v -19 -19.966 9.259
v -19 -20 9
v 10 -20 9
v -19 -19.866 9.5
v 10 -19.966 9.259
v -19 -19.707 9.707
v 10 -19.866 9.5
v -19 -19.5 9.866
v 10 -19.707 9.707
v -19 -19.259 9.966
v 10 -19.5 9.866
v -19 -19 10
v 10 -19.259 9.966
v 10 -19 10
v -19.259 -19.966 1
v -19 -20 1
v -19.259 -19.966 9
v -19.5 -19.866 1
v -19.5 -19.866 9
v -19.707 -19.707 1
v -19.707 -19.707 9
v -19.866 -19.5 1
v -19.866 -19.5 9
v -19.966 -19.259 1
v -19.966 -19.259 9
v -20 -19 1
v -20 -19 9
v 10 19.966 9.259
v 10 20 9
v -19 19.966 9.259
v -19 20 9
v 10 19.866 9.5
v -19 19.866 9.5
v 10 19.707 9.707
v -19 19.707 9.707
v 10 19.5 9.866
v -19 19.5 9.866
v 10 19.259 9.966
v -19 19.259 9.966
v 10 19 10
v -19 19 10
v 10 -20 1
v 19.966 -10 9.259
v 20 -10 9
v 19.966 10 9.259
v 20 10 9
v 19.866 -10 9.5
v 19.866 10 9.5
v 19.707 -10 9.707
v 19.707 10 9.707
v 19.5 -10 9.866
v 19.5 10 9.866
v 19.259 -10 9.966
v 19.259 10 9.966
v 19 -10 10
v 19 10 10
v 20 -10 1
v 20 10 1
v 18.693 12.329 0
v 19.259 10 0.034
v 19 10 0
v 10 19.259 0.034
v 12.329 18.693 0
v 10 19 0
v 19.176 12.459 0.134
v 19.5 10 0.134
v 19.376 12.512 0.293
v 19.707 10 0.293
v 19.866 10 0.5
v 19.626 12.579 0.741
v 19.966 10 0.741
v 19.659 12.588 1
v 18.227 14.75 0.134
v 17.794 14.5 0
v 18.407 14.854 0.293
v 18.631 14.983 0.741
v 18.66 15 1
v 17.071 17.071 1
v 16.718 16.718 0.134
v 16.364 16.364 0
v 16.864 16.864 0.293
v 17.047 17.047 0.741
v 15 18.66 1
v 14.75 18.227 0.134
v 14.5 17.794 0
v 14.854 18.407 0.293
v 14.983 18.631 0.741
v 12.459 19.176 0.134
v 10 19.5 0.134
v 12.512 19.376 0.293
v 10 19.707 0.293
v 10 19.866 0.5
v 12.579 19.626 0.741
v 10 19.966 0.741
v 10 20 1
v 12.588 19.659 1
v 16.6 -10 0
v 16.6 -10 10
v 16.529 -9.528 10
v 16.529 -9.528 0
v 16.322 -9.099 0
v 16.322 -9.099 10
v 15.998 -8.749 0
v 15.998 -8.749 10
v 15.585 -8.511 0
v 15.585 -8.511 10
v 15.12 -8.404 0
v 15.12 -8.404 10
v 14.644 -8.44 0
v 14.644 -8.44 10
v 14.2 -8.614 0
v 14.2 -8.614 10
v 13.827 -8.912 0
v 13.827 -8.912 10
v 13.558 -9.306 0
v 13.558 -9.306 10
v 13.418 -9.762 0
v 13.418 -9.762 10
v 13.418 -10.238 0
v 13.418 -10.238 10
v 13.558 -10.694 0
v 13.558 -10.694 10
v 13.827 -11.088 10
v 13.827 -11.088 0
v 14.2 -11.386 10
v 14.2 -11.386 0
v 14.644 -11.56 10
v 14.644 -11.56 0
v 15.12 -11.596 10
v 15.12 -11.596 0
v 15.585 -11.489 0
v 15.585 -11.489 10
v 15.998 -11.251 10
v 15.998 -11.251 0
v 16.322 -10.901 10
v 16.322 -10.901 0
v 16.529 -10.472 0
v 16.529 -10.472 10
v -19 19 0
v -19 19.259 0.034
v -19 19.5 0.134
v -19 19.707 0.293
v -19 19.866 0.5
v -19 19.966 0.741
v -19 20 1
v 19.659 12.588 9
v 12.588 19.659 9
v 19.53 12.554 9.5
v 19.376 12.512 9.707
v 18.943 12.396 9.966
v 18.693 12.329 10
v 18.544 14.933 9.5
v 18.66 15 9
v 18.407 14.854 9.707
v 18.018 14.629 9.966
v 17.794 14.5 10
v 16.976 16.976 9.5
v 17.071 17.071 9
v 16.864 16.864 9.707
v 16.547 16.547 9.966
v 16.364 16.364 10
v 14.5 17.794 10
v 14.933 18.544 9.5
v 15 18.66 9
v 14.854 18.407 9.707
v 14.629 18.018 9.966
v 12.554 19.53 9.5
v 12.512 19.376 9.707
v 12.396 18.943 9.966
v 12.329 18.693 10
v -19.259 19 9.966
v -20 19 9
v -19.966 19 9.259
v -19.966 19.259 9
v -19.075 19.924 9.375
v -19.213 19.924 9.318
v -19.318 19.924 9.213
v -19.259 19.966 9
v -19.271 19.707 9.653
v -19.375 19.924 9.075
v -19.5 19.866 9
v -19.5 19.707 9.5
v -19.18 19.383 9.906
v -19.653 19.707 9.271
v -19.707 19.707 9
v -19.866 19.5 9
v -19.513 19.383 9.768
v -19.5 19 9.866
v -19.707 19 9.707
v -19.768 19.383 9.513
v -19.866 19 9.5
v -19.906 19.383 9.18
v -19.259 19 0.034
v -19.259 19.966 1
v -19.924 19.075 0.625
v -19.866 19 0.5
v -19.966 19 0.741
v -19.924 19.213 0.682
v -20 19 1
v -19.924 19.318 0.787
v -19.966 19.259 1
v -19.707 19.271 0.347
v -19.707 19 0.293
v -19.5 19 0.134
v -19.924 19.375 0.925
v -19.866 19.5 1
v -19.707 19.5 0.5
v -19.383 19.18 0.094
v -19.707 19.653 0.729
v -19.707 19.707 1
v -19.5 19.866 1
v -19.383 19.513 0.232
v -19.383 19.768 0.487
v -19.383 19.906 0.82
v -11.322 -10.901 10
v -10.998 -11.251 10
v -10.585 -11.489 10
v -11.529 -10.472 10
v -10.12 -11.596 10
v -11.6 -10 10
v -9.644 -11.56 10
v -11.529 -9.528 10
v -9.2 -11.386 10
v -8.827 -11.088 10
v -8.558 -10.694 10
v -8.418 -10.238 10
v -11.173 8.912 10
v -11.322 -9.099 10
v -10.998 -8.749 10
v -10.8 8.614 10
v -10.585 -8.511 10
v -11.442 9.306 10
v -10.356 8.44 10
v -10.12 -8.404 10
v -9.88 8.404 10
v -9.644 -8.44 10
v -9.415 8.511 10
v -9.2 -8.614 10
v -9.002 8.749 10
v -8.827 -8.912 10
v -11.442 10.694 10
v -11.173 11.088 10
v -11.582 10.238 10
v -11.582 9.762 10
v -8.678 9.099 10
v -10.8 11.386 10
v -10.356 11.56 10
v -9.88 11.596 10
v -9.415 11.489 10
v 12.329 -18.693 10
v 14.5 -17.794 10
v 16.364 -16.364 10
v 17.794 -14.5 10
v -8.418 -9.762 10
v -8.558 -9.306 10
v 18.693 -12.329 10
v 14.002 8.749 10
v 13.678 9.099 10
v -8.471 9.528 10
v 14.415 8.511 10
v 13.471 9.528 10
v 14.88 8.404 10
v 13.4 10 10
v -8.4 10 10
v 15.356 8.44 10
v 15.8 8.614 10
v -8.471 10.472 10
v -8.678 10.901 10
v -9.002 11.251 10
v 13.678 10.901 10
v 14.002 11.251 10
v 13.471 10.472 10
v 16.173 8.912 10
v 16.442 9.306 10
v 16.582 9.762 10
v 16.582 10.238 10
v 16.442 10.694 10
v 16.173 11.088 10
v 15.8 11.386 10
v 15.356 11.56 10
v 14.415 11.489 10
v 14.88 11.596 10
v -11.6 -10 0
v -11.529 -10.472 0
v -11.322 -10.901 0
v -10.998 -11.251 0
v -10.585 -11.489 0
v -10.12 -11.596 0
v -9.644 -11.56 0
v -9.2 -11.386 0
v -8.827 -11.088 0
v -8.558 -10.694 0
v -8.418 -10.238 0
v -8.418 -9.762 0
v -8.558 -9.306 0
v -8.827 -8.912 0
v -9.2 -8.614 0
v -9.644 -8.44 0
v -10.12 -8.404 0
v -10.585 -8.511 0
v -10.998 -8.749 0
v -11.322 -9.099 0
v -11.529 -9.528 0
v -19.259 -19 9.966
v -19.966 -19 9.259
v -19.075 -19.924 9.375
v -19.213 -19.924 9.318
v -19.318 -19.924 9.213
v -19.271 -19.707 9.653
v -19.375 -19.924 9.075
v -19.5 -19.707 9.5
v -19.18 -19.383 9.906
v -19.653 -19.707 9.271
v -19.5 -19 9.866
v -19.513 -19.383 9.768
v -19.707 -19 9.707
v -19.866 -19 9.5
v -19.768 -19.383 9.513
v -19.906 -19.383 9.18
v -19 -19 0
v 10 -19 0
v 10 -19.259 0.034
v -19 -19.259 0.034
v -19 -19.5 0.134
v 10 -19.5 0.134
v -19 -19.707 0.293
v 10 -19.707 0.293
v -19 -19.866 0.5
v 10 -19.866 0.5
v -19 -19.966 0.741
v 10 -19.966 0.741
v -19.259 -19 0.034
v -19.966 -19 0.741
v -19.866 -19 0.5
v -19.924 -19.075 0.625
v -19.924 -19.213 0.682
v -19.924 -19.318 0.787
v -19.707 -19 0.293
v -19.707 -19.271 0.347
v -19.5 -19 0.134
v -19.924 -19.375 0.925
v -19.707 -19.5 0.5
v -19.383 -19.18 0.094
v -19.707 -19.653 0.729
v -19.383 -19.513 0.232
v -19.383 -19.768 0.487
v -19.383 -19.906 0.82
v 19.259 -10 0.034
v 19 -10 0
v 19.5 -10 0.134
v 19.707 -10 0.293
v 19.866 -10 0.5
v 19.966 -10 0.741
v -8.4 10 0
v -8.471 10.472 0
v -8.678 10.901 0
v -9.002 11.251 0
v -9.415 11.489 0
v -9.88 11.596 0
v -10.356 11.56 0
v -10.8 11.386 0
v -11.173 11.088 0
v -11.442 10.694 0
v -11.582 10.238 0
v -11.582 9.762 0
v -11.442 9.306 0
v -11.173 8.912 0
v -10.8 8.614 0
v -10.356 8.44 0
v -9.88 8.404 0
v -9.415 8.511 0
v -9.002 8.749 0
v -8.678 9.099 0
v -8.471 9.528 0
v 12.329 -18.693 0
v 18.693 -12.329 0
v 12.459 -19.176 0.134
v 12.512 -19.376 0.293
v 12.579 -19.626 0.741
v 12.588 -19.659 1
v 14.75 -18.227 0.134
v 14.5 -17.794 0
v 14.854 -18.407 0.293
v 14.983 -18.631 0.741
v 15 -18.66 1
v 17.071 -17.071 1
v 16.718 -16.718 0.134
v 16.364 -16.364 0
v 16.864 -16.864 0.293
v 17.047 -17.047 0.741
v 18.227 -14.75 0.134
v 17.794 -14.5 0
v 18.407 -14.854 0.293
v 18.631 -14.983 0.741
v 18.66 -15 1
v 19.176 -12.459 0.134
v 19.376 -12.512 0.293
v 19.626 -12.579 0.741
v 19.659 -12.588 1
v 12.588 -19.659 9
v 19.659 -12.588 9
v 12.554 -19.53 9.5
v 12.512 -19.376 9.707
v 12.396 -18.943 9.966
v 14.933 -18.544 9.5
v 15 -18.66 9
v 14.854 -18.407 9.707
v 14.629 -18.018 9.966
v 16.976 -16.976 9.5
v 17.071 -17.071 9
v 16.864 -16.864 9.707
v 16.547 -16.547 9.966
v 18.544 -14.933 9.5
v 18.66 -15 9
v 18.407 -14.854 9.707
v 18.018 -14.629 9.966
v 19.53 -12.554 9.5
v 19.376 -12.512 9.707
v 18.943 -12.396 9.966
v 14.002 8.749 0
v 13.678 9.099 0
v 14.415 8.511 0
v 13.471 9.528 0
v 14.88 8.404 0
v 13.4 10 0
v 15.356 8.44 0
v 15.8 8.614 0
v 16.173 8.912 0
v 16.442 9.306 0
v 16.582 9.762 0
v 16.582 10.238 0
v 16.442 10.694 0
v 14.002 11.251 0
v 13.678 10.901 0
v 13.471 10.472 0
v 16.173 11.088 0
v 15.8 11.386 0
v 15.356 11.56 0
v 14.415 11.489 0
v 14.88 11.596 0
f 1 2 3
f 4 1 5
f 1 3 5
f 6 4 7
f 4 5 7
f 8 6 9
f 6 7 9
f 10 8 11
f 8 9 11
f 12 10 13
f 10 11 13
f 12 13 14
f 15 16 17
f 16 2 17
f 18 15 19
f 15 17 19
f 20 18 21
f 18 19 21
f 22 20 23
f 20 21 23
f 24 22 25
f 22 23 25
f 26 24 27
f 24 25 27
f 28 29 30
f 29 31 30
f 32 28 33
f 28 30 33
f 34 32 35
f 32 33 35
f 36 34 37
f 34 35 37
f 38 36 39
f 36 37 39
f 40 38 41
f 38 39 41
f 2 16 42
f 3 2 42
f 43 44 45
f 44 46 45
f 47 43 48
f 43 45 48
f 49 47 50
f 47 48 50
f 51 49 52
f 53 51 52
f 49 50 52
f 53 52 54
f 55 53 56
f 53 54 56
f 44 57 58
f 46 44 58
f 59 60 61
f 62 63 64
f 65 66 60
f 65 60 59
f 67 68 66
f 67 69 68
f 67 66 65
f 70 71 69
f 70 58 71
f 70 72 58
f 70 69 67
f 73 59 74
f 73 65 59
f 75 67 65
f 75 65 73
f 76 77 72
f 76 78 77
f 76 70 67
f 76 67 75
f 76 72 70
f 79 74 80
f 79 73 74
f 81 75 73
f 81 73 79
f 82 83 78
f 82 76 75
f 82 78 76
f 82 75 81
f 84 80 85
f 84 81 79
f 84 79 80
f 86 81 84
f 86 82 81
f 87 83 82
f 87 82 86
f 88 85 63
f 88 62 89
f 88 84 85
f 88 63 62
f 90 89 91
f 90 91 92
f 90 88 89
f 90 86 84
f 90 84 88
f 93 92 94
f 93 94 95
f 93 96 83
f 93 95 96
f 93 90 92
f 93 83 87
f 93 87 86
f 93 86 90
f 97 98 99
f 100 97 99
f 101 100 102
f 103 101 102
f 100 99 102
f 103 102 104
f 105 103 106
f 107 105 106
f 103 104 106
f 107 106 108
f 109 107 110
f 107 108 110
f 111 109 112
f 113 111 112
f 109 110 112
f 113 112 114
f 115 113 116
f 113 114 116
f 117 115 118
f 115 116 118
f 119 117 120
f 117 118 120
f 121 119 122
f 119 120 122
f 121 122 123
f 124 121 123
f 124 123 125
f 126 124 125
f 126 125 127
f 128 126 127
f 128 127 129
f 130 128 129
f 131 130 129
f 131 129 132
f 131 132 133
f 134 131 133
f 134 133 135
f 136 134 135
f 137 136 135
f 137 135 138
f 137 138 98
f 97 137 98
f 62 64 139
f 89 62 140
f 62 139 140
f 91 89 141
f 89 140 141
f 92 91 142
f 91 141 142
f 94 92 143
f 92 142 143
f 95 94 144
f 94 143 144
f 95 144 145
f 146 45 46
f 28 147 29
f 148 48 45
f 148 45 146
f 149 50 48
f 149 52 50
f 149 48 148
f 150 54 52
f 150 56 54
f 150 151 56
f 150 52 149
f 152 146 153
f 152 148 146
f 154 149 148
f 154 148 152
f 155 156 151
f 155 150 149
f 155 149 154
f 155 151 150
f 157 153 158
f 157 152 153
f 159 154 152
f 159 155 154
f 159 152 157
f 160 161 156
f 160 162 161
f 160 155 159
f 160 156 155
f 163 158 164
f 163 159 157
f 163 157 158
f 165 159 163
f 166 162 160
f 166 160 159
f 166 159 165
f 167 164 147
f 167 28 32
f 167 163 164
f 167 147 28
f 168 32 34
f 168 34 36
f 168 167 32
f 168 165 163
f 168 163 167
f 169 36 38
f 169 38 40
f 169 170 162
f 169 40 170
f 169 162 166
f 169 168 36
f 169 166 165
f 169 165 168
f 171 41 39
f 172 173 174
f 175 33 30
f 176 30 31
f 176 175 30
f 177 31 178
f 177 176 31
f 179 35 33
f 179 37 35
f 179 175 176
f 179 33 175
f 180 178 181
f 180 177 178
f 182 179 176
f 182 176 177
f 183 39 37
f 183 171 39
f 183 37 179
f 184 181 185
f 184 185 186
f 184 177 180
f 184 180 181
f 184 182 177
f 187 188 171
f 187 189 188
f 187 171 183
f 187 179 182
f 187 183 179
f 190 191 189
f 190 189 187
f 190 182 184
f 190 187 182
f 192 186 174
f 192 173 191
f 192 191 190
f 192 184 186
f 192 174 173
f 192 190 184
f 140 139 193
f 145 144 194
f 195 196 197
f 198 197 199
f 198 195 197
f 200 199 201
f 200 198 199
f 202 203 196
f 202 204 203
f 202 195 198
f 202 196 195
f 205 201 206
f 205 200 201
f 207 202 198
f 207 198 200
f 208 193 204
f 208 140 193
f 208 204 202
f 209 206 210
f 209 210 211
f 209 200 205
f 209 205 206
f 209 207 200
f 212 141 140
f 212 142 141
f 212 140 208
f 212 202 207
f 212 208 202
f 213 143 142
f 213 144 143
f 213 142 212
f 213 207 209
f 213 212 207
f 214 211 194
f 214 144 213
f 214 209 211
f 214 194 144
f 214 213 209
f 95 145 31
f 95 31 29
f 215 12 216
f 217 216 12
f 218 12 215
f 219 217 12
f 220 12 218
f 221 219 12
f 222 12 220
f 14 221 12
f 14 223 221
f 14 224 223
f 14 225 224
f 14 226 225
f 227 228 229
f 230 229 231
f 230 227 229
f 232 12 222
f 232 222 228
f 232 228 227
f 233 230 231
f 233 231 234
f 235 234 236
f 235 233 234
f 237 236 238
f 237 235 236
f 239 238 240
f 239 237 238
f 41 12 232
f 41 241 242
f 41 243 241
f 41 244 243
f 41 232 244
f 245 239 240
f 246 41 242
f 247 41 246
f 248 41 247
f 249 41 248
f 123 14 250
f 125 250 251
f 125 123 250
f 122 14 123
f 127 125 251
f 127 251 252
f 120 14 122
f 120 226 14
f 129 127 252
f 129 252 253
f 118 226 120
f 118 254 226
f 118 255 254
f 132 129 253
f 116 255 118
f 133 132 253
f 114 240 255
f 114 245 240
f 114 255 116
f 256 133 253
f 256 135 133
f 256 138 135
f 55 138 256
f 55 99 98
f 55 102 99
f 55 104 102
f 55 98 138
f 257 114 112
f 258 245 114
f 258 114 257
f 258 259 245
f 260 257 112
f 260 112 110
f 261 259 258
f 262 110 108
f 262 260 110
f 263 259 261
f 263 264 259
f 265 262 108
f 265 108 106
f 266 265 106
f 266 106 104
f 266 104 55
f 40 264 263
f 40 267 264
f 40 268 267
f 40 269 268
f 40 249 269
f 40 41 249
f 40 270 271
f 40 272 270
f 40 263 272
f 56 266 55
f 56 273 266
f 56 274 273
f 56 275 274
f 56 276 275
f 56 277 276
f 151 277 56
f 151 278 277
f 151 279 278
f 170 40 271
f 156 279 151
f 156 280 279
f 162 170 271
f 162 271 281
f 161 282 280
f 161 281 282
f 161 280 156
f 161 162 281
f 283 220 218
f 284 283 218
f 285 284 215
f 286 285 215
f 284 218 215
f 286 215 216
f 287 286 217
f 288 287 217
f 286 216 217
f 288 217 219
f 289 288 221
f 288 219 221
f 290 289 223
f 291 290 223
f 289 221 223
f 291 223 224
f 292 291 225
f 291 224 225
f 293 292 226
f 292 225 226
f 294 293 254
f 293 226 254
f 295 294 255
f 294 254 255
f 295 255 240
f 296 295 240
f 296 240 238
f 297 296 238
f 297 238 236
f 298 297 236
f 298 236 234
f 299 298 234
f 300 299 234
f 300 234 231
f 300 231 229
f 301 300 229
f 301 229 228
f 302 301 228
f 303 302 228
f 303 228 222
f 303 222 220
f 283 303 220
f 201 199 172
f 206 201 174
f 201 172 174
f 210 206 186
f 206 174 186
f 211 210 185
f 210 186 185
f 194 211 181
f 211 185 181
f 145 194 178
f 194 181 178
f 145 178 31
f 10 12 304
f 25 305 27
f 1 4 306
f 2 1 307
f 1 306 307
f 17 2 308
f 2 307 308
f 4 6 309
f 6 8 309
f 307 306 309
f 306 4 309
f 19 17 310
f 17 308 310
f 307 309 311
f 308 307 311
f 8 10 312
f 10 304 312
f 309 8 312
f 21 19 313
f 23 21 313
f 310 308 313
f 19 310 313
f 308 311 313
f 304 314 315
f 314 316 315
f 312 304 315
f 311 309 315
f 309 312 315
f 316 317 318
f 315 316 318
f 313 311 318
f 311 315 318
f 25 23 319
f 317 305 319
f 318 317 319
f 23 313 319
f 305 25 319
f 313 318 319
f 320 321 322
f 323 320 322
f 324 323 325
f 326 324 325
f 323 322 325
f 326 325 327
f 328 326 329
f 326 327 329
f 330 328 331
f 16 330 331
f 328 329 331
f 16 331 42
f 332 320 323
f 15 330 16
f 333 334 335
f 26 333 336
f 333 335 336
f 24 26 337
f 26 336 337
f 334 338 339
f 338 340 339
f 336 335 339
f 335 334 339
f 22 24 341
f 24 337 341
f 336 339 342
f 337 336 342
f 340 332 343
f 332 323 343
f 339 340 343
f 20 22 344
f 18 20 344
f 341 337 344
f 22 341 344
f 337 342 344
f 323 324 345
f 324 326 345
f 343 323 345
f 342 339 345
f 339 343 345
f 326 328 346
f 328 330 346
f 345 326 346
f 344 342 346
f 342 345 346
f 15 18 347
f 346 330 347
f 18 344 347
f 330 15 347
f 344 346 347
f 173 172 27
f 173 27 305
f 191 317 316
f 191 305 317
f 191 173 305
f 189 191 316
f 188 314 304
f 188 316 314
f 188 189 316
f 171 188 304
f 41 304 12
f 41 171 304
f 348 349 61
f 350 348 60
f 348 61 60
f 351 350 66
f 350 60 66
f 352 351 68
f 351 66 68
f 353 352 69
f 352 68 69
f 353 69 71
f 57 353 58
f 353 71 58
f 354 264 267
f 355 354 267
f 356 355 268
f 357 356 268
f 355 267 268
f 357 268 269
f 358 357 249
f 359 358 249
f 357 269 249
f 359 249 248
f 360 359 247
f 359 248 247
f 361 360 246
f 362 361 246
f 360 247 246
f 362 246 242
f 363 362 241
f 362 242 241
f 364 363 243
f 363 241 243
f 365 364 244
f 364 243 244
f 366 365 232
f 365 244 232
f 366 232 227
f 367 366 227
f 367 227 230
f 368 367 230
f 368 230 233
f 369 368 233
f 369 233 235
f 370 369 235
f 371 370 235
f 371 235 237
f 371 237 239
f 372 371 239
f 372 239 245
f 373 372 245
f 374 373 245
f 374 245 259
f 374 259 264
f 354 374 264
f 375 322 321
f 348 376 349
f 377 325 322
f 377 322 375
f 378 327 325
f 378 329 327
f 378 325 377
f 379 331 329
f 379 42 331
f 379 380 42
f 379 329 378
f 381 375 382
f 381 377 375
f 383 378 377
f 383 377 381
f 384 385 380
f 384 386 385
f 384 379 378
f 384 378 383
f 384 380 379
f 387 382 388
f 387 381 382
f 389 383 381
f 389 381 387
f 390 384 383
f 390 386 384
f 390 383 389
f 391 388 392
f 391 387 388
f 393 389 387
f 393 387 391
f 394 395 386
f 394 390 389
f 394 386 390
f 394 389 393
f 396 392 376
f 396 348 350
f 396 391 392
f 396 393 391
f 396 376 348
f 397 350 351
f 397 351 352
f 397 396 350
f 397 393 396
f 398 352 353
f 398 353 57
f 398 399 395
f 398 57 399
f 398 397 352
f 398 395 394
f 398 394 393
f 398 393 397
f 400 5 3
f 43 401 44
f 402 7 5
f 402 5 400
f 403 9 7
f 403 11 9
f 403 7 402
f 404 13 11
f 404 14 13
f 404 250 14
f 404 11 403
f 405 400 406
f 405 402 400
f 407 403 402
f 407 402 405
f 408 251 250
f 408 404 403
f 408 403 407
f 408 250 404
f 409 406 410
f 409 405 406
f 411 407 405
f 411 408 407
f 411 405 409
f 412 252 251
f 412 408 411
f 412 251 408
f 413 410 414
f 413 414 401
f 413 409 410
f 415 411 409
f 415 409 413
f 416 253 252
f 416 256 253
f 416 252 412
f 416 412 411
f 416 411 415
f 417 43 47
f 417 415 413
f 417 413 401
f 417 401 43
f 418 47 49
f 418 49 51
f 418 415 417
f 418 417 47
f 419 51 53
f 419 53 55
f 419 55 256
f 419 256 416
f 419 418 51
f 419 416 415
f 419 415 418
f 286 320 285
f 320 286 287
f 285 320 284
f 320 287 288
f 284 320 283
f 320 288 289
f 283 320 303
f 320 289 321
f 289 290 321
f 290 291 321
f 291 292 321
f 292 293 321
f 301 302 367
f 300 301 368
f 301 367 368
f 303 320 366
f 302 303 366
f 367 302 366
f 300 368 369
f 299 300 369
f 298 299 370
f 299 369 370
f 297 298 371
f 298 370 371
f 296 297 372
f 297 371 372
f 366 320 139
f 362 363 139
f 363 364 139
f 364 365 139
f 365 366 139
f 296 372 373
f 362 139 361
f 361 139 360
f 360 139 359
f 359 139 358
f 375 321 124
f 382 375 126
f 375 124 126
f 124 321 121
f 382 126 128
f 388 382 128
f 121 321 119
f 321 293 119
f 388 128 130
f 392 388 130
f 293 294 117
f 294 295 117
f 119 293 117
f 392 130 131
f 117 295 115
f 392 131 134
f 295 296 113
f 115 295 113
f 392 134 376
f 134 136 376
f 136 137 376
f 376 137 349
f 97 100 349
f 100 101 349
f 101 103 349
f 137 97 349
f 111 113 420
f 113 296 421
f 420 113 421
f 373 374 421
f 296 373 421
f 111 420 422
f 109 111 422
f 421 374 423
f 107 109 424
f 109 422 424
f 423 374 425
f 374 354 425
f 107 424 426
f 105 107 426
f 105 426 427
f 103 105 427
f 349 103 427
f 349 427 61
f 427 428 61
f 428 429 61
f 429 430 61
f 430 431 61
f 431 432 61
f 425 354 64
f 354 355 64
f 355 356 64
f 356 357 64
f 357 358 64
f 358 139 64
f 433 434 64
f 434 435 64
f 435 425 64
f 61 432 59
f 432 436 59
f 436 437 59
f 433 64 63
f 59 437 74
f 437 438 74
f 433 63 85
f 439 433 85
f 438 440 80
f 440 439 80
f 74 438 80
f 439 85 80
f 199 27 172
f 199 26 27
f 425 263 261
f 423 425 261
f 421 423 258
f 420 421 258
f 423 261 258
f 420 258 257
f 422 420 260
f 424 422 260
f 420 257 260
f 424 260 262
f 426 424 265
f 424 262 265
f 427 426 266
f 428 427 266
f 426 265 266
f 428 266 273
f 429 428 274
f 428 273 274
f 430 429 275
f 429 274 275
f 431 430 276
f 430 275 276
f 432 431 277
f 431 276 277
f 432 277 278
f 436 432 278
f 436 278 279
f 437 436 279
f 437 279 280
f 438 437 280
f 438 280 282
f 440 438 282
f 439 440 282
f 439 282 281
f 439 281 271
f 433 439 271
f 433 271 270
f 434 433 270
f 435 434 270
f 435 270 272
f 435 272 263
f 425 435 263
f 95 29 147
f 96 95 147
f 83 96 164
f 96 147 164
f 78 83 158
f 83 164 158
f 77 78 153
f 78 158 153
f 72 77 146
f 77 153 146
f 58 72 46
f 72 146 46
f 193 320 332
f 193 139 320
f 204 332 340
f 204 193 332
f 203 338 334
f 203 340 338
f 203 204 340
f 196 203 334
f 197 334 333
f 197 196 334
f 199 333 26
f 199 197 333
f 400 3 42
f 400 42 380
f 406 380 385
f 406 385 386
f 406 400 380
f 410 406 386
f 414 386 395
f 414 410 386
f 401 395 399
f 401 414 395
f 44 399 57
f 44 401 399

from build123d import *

# Parameters (mm, degrees)
SKETCH_1_W          = 40
SKETCH_1_H          = 40
EXTRUDE_1_DEPTH     = 10
SKETCH_2_R          = 1.6
CUT_EXTRUDE_1_DEPTH = 31
FILLET_1_R          = 10
FILLET_2_R          = 1


with BuildPart() as part:
    # 草图1 → 凸台-拉伸1 (new body)
    with BuildSketch(Plane.XY):
        Rectangle(SKETCH_1_W, SKETCH_1_H)
    extrude(amount=EXTRUDE_1_DEPTH)

    # 草图2 → 切除-拉伸1 (cut, through all)
    with BuildSketch(Plane.XY.offset(10)):
        with Locations((-10, 10)):
            Circle(SKETCH_2_R)
        with Locations(Location((15, 10, 0), (0, 0, 180))):
            Circle(SKETCH_2_R)
        with Locations((15, -10)):
            Circle(SKETCH_2_R)
        with Locations(Location((-10, -10, 0), (0, 0, 180))):
            Circle(SKETCH_2_R)
    extrude(amount=-CUT_EXTRUDE_1_DEPTH, mode=Mode.SUBTRACT)

    # 圆角1
    fillet_1_edges = [part.edges().sort_by_distance(p)[0] for p in [
        (20, -20, 5),
        (20, 20, 5),
    ]]
    fillet(fillet_1_edges, radius=FILLET_1_R)

    # 圆角2
    fillet_2_edges = [part.edges().sort_by_distance(p)[0] for p in [
        (-20, 0, 10),
        (-5, -20, 10),
        (20, 0, 0),
        (20, 0, 10),
        (-5, 20, 0),
        (17.071067812, 17.071067812, 0),
        (17.071067812, -17.071067812, 0),
        (-5, 20, 10),
        (17.071067812, 17.071067812, 10),
        (17.071067812, -17.071067812, 10),
        (-5, -20, 0),
        (-20, 0, 0),
        (-20, -20, 5),
        (-20, 20, 5),
    ]]
    fillet(fillet_2_edges, radius=FILLET_2_R)


solid = part.part
